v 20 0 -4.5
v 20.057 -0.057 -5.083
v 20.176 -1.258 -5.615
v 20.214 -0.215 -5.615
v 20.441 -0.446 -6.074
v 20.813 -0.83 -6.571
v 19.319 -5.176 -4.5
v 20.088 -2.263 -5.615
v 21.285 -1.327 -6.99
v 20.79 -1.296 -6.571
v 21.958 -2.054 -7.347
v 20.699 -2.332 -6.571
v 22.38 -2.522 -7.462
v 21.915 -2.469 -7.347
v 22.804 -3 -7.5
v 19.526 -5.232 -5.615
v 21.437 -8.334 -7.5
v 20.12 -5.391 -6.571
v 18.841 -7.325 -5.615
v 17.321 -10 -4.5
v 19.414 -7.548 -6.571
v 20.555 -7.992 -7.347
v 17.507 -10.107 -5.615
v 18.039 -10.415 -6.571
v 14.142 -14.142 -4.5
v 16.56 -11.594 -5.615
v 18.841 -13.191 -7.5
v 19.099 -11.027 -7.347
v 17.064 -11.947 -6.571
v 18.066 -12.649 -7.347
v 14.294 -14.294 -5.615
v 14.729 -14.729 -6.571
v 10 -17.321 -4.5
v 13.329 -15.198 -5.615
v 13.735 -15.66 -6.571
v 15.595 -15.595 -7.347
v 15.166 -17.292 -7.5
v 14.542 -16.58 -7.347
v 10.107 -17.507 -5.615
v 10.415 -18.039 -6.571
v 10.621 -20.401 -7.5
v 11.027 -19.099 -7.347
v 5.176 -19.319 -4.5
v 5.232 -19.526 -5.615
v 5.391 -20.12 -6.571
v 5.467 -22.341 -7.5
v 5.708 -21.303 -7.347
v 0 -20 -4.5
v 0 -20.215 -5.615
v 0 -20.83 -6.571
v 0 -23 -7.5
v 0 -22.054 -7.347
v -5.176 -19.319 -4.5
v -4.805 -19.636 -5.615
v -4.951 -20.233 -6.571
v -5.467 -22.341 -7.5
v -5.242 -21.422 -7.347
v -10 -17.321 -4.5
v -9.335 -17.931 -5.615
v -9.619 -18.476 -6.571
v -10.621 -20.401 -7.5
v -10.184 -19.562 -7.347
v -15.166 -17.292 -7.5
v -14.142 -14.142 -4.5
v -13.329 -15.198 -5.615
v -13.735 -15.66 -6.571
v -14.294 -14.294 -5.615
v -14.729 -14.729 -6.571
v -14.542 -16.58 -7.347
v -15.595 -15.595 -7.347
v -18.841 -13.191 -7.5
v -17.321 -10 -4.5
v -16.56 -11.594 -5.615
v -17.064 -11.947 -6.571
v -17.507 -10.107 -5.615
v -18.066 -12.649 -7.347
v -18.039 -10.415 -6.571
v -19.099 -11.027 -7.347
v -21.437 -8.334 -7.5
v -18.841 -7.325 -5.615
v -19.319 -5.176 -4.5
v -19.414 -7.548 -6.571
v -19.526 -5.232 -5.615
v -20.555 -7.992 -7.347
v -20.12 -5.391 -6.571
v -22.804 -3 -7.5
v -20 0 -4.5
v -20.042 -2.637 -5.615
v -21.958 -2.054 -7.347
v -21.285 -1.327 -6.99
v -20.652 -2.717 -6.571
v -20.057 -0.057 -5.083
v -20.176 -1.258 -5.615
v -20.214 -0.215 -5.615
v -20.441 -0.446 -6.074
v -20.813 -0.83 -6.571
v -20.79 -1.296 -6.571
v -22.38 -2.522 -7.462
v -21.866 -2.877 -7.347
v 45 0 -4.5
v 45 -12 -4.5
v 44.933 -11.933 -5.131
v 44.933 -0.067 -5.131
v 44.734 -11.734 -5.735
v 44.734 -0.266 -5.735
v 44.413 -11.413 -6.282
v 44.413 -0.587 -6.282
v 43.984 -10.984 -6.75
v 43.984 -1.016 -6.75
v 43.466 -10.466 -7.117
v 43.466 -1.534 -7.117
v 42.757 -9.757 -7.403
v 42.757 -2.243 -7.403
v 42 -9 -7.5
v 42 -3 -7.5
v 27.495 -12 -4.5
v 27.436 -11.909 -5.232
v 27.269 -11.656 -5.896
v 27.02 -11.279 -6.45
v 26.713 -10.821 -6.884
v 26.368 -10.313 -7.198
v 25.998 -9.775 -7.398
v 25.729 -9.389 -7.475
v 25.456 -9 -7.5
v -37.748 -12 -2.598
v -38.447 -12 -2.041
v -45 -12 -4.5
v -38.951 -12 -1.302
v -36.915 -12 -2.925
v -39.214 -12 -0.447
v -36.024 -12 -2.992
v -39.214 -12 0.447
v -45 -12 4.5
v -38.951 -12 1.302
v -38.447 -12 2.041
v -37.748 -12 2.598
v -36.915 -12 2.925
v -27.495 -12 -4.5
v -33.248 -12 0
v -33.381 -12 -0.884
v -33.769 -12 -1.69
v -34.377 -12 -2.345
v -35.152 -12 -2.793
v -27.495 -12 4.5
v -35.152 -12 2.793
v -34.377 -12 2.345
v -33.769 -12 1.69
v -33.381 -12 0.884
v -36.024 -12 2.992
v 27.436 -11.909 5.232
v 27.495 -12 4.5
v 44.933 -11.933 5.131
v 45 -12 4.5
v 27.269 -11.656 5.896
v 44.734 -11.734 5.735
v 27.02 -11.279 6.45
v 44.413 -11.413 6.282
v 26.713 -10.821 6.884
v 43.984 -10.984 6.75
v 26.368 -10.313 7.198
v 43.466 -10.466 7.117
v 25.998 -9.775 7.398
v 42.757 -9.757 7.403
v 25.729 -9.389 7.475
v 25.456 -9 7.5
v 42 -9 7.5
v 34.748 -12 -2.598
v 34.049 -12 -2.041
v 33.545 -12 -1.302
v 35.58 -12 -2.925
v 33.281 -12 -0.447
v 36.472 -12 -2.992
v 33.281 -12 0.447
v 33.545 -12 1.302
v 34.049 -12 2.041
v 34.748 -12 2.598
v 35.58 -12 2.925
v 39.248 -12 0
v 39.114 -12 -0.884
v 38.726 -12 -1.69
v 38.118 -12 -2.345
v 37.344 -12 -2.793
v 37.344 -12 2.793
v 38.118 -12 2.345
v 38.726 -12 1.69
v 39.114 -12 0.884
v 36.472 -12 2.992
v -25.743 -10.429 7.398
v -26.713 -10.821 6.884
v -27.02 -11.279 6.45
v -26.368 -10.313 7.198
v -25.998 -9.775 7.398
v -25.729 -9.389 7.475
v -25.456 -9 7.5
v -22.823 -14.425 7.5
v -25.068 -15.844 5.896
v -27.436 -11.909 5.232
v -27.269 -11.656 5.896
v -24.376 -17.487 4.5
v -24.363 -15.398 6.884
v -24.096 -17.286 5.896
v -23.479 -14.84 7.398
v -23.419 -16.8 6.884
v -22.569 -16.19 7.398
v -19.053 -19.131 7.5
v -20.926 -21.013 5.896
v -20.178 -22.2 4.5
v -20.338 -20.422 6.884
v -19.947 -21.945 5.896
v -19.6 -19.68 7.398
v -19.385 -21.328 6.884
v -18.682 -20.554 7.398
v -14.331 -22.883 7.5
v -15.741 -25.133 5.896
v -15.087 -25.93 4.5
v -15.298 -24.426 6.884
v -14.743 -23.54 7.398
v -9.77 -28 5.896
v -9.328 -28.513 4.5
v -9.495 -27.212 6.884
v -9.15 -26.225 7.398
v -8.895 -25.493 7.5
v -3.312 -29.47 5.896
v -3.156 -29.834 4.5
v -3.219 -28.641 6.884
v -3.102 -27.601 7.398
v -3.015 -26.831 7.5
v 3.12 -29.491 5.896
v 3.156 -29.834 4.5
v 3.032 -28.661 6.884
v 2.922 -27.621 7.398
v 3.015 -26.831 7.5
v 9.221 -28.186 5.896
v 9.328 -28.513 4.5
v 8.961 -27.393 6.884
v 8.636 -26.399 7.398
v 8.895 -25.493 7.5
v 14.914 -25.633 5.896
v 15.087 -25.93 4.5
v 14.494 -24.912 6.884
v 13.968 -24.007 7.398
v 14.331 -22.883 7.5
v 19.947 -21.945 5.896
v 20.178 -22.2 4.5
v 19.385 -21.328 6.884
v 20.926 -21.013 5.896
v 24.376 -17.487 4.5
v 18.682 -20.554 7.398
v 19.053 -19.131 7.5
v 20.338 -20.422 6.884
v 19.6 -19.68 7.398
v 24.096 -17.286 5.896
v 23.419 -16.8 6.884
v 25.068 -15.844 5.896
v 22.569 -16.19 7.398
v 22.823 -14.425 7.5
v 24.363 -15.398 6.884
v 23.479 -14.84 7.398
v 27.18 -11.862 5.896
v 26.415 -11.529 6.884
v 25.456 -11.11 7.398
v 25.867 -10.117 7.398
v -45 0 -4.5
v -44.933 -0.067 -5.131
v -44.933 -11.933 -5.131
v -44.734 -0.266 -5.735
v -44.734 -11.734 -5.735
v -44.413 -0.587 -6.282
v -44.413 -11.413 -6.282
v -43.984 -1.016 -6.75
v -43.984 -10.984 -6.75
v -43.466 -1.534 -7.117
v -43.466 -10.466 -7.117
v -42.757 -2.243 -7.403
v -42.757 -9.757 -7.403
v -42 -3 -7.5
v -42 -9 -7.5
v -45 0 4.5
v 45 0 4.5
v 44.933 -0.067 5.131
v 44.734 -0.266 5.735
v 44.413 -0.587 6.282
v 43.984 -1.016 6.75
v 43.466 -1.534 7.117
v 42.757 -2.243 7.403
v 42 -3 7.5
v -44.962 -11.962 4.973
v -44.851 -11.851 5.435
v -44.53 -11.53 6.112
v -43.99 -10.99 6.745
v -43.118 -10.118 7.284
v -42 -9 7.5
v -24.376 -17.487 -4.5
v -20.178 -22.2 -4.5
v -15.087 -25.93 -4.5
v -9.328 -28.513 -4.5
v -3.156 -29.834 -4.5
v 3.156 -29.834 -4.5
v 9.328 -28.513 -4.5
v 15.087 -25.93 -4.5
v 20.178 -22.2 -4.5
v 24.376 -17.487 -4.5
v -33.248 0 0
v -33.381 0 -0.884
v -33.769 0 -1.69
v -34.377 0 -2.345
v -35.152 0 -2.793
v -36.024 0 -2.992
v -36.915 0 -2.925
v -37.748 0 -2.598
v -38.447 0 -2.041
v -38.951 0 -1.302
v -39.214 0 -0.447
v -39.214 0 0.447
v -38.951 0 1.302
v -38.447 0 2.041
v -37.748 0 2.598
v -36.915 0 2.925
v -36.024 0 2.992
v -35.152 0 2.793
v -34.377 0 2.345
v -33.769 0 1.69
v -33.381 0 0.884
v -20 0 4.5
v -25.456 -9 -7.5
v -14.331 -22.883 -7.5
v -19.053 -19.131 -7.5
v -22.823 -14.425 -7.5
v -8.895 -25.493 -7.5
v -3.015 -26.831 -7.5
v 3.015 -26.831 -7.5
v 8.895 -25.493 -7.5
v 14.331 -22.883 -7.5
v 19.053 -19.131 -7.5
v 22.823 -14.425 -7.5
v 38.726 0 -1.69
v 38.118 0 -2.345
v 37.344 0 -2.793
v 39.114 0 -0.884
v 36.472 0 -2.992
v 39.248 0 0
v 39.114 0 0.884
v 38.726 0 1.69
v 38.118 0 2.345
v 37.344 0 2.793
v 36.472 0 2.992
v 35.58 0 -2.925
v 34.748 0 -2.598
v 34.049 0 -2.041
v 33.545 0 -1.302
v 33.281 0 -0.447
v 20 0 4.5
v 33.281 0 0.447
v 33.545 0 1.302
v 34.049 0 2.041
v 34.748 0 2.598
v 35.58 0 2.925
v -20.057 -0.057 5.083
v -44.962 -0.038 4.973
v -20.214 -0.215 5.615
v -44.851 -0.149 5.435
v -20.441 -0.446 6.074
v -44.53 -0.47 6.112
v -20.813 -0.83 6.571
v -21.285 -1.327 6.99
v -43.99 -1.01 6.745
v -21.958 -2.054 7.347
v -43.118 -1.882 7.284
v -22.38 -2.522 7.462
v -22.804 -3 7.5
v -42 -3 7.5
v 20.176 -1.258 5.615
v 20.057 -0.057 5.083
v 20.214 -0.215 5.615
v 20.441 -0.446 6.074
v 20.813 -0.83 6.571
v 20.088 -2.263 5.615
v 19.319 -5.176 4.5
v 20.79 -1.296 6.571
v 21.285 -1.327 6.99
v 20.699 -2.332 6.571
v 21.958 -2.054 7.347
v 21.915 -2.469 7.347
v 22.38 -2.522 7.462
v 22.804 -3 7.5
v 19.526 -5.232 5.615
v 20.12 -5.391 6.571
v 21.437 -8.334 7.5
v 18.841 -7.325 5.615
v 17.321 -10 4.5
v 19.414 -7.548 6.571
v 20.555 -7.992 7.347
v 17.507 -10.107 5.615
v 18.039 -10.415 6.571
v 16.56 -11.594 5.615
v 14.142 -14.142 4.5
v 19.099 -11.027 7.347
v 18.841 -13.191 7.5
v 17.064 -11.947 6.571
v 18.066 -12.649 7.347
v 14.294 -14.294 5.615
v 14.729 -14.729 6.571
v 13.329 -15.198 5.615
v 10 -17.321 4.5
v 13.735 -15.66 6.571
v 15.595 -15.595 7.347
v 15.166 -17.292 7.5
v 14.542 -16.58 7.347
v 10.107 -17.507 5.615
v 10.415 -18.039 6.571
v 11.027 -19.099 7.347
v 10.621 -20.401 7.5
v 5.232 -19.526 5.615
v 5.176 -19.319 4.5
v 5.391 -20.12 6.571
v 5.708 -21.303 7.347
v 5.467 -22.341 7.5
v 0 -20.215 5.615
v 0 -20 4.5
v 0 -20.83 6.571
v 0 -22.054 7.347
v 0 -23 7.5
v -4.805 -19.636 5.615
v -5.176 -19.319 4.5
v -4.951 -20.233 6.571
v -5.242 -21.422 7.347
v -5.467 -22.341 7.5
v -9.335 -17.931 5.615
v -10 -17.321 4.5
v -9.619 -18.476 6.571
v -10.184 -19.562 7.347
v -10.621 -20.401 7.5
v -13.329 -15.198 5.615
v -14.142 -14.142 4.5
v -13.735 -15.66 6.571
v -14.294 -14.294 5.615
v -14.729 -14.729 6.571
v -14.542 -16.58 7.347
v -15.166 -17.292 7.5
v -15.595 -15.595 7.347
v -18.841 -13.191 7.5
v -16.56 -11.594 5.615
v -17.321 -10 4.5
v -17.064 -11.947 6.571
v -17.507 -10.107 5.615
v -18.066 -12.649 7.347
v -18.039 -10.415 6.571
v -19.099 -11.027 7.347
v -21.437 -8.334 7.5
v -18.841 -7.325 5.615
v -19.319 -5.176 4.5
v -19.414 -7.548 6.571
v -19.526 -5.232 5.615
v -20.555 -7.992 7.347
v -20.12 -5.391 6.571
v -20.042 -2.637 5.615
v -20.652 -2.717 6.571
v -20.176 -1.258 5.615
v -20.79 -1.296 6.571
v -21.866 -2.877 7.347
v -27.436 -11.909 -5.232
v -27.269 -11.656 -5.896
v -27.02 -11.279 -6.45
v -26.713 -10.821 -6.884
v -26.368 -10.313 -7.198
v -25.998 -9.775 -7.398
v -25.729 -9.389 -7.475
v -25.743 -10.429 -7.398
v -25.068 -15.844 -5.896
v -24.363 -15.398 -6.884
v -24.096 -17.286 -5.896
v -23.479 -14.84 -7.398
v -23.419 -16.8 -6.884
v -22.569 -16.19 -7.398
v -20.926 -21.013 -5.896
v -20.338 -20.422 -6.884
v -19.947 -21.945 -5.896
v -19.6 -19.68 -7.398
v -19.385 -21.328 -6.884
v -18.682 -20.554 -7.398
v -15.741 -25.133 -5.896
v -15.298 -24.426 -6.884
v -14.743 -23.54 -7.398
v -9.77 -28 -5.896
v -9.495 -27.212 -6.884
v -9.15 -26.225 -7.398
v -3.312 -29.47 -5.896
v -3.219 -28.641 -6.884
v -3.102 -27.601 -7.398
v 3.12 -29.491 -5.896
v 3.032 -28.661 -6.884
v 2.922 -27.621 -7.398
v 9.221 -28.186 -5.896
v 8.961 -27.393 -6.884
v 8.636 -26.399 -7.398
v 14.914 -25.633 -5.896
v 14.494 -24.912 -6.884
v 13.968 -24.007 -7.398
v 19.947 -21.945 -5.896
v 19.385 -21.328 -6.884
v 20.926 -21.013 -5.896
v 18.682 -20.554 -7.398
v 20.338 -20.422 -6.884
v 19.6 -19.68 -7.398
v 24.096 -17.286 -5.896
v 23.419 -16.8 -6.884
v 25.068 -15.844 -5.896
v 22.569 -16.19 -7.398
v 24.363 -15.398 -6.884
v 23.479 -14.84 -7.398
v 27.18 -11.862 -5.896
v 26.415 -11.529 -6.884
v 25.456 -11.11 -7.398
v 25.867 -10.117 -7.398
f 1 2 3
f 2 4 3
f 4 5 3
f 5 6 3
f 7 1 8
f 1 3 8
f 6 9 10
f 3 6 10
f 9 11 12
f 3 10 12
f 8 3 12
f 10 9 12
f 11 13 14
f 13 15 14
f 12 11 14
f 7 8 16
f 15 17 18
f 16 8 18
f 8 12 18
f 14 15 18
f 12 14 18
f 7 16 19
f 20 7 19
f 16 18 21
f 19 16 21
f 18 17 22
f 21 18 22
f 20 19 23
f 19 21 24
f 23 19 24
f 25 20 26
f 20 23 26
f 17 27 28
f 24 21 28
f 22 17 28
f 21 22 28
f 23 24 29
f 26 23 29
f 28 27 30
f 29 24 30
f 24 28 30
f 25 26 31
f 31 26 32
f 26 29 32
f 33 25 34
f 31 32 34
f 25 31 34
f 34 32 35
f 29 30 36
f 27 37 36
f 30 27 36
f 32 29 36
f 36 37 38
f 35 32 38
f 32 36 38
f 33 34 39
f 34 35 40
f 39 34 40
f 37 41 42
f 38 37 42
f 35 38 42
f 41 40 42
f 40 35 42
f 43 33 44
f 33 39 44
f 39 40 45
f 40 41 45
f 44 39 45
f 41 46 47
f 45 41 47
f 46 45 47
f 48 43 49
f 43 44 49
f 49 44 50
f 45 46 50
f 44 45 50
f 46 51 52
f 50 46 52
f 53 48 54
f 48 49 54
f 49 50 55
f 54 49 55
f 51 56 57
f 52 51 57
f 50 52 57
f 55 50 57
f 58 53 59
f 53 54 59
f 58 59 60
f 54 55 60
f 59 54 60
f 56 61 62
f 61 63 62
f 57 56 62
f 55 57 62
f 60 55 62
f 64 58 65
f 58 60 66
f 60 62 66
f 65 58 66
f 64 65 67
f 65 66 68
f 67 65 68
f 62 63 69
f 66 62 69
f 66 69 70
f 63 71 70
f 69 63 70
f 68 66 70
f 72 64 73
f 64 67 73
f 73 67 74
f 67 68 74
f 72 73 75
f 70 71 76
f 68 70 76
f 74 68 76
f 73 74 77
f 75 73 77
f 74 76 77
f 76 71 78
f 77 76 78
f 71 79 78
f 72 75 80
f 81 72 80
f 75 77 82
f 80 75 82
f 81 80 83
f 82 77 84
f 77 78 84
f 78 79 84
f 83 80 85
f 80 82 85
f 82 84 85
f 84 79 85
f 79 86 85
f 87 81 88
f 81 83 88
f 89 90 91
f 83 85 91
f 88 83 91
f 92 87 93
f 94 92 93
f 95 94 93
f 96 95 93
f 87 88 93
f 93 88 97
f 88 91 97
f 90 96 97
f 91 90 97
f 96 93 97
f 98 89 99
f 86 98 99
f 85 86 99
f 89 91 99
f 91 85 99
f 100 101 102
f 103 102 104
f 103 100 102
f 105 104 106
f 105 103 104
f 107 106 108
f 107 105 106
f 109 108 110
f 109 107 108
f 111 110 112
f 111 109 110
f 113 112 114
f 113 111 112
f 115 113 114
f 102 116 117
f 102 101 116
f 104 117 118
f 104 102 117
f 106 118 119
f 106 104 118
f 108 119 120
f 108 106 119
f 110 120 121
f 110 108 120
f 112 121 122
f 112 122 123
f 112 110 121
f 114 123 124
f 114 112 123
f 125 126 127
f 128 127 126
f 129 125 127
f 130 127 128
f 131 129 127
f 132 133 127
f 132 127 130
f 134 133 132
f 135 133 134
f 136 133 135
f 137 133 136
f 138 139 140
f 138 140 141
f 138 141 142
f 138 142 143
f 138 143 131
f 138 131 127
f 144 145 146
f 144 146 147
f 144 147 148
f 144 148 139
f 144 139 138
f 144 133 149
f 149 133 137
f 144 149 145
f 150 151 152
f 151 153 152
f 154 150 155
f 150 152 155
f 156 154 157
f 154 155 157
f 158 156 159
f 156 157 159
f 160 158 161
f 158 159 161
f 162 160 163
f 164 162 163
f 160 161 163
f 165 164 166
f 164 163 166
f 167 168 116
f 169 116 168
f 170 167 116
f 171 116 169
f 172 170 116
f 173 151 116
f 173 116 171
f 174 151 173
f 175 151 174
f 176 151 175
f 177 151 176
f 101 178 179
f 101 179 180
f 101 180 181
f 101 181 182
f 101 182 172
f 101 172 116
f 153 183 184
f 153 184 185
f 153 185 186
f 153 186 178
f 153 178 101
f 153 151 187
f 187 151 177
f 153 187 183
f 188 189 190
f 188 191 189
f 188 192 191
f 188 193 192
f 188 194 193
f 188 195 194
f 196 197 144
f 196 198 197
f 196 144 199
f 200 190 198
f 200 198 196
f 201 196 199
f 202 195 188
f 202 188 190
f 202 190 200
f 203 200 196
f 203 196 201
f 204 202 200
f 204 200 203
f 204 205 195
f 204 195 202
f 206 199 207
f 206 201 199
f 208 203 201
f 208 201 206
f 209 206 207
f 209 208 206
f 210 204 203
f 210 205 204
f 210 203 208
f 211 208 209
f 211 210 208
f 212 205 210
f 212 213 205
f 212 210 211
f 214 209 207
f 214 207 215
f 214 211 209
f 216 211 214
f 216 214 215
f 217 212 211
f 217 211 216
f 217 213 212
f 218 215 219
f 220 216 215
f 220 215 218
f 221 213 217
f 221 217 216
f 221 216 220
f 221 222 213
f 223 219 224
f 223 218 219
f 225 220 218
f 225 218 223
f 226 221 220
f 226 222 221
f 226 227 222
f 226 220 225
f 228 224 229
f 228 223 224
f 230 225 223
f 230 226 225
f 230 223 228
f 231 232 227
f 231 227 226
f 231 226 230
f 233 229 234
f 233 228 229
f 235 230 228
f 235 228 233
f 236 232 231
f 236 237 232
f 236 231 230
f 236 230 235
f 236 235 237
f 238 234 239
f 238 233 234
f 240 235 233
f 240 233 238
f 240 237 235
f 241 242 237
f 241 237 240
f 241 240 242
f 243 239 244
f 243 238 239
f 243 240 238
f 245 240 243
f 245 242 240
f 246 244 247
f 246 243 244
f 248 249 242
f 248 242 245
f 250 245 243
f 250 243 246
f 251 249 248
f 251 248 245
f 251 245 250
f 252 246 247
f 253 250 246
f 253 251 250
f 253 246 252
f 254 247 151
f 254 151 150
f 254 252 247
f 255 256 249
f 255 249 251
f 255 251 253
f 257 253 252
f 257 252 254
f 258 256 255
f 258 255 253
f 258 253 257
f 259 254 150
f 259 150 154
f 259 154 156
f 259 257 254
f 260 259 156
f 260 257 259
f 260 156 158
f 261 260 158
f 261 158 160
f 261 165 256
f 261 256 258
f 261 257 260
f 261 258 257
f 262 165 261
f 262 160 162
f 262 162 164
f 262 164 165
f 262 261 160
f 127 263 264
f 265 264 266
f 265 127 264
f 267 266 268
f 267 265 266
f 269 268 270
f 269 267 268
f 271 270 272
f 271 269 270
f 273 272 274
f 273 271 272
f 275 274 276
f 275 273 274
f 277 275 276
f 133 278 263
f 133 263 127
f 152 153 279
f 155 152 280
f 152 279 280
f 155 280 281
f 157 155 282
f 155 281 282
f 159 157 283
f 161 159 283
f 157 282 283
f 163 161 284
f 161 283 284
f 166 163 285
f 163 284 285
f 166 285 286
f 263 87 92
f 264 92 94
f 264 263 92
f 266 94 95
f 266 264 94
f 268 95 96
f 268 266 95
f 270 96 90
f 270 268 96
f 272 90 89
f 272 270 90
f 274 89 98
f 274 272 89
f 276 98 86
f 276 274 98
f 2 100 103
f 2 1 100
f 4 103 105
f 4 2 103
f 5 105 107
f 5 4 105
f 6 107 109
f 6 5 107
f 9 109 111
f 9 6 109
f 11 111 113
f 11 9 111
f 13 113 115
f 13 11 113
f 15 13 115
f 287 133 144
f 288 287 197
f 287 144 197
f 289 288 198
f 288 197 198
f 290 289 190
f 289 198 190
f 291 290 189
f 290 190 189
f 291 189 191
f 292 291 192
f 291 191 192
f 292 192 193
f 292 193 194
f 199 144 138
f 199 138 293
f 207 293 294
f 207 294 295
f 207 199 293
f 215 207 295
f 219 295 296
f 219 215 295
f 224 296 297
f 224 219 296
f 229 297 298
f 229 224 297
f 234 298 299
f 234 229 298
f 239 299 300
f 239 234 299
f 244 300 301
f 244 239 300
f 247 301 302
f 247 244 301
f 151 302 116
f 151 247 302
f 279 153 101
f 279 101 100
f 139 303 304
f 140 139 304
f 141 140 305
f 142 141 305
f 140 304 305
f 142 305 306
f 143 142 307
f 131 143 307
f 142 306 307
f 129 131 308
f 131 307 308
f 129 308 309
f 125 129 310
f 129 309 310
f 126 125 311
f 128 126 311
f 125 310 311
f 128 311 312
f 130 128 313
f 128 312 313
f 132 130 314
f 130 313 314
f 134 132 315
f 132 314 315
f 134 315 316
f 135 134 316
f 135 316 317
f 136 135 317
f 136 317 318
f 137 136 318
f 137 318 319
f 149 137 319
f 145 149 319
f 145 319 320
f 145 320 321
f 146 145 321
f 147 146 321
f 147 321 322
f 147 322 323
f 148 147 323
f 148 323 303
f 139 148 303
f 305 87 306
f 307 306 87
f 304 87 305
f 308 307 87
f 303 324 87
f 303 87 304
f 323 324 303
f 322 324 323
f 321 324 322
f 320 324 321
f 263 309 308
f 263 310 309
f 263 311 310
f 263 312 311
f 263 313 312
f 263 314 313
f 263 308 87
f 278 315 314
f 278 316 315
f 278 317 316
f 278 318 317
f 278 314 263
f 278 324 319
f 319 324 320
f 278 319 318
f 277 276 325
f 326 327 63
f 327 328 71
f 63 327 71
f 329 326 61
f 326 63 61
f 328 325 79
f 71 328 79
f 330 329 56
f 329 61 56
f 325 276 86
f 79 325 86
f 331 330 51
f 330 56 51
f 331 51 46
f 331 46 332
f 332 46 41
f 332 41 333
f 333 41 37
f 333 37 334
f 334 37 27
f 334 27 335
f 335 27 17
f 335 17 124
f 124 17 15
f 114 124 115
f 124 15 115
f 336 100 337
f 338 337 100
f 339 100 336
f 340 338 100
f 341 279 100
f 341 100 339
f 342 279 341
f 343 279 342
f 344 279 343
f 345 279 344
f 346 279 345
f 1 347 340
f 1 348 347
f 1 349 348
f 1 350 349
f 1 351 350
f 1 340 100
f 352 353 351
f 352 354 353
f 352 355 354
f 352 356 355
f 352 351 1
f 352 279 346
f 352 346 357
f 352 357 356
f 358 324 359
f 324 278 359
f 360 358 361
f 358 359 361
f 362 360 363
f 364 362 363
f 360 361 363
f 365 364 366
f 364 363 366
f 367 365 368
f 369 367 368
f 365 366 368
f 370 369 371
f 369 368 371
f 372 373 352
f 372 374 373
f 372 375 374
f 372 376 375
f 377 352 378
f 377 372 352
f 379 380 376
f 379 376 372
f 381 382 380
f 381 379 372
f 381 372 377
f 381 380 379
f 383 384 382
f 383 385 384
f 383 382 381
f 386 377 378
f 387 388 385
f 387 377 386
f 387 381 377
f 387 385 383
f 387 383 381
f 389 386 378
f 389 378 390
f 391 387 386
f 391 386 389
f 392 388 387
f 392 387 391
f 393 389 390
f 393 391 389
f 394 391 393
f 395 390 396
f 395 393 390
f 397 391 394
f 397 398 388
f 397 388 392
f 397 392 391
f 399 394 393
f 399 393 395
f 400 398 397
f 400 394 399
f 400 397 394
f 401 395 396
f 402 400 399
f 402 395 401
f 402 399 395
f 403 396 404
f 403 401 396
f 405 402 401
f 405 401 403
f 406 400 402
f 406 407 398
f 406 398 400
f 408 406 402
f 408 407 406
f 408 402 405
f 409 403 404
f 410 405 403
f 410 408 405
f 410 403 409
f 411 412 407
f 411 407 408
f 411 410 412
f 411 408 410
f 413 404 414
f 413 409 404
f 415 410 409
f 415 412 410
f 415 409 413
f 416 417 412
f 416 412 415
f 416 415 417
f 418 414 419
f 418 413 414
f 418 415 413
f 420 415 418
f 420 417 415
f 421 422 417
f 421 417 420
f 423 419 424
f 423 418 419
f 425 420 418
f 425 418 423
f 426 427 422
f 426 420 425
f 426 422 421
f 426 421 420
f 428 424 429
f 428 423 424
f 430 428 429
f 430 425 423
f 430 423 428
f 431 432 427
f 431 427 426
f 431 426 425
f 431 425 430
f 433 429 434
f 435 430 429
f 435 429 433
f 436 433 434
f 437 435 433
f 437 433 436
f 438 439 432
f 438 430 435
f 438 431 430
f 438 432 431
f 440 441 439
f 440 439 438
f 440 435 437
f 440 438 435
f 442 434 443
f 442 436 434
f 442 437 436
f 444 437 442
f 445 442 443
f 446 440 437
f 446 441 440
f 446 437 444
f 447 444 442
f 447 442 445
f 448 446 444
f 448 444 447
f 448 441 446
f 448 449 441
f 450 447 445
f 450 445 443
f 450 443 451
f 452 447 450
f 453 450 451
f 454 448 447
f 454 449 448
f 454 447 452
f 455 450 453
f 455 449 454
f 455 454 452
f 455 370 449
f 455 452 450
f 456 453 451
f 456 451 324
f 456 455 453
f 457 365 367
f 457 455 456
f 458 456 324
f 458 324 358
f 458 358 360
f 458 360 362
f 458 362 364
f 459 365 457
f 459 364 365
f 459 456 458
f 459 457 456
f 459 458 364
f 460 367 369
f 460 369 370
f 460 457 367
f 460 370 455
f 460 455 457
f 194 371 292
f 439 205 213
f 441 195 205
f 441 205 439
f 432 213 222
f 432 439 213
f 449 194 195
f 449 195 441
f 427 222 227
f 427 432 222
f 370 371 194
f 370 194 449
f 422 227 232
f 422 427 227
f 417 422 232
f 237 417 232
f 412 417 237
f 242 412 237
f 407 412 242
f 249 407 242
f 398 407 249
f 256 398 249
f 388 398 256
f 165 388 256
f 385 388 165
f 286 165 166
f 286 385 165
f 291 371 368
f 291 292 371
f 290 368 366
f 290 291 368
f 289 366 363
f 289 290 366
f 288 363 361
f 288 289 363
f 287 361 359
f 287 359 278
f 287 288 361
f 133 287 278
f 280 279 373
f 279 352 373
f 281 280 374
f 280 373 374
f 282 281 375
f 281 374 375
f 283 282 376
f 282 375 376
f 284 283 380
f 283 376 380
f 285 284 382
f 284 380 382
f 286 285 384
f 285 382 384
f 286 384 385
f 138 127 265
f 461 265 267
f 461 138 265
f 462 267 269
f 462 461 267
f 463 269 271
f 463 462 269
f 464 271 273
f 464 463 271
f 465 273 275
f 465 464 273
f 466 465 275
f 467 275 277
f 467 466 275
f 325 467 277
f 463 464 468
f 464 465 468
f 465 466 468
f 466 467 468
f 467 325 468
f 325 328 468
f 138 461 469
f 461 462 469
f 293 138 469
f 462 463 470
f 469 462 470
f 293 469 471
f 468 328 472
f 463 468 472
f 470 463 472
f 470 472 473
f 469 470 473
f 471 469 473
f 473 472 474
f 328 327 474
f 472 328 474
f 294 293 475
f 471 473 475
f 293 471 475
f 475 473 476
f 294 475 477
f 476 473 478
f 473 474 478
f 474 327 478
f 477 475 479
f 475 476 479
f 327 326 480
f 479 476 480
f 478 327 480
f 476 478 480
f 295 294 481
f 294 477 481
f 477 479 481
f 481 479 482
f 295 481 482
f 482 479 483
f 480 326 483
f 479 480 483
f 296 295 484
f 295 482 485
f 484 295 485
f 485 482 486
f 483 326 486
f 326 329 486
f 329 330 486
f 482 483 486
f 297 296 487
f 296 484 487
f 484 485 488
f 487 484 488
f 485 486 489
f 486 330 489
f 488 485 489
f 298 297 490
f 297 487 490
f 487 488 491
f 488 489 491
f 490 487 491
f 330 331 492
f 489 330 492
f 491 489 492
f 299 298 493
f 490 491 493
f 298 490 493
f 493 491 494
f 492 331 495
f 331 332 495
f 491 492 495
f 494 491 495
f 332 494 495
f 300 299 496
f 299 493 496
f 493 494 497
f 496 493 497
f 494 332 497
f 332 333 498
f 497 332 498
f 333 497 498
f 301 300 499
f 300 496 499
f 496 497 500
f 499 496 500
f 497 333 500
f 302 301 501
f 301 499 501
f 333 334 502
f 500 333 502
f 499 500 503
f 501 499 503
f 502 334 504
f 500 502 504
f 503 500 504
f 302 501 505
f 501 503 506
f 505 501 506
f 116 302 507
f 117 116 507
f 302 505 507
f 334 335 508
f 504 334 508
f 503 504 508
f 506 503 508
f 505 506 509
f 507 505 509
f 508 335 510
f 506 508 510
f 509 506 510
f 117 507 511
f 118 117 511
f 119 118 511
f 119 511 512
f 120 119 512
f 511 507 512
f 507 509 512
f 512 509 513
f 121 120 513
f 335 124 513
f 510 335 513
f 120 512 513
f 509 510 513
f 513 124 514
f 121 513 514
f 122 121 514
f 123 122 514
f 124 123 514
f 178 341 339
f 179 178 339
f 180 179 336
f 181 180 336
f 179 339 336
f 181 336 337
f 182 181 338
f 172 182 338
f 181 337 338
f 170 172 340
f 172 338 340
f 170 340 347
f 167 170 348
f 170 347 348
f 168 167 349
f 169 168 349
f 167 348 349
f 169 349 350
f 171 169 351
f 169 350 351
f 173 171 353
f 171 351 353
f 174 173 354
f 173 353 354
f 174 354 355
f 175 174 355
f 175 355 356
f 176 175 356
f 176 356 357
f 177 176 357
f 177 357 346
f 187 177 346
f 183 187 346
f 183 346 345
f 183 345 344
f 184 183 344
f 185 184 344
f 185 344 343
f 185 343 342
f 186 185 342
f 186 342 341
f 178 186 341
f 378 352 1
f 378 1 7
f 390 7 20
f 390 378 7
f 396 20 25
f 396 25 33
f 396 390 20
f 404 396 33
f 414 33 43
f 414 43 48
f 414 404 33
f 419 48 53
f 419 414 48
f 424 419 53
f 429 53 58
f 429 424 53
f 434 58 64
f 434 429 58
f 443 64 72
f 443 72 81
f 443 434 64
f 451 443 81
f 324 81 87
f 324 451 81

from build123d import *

# Parameters (mm, degrees)
BOSS_EXTRUDE1_DEPTH   = 7.5
FILLET2_R             = 3
F_6_0MM_DOWEL_HOLE1_D = 6


with BuildPart() as part:
    # Sketch1 → Boss-Extrude1 (new, symmetric)
    with BuildSketch(Plane.XY):
        with BuildLine():
            Line((-20, 0), (-45, 0))
            Line((-45, 0), (-45, -12))
            Line((-45, -12), (-27.49545417, -12))
            ThreePointArc((-27.49545417, -12), (0, -30), (27.49545417, -12))
            Line((27.49545417, -12), (45, -12))
            Line((45, -12), (45, 0))
            Line((45, 0), (20, 0))
            ThreePointArc((20, 0), (0, -20), (-20, 0))
        make_face()
    extrude(amount=BOSS_EXTRUDE1_DEPTH, both=True)

    # Fillet2
    fillet2_edges = [part.edges().sort_by_distance(p)[0] for p in [
        (-36.247727085, -12, -7.5),
        (-45, -6, -7.5),
        (-32.5, 0, -7.5),
        (0, -20, -7.5),
        (-45, -6, 7.5),
        (-36.247727085, -12, 7.5),
        (0, -30, 7.5),
        (36.247727085, -12, 7.5),
        (45, -6, 7.5),
        (32.5, 0, 7.5),
        (0, -20, 7.5),
        (32.5, 0, -7.5),
        (-32.5, 0, 7.5),
        (45, -6, -7.5),
        (36.247727085, -12, -7.5),
        (0, -30, -7.5),
    ]]
    fillet(fillet2_edges, radius=FILLET2_R)

    # Ø6.0mm Dowel Hole1 (through all)
    with Locations(Plane(origin=(0, -12, 0), x_dir=(-1, 0, 0), z_dir=(0, -1, 0))):
        with Locations((36.247727085, 0), (-36.247727085, 0)):
            Hole(F_6_0MM_DOWEL_HOLE1_D / 2)


solid = part.part
